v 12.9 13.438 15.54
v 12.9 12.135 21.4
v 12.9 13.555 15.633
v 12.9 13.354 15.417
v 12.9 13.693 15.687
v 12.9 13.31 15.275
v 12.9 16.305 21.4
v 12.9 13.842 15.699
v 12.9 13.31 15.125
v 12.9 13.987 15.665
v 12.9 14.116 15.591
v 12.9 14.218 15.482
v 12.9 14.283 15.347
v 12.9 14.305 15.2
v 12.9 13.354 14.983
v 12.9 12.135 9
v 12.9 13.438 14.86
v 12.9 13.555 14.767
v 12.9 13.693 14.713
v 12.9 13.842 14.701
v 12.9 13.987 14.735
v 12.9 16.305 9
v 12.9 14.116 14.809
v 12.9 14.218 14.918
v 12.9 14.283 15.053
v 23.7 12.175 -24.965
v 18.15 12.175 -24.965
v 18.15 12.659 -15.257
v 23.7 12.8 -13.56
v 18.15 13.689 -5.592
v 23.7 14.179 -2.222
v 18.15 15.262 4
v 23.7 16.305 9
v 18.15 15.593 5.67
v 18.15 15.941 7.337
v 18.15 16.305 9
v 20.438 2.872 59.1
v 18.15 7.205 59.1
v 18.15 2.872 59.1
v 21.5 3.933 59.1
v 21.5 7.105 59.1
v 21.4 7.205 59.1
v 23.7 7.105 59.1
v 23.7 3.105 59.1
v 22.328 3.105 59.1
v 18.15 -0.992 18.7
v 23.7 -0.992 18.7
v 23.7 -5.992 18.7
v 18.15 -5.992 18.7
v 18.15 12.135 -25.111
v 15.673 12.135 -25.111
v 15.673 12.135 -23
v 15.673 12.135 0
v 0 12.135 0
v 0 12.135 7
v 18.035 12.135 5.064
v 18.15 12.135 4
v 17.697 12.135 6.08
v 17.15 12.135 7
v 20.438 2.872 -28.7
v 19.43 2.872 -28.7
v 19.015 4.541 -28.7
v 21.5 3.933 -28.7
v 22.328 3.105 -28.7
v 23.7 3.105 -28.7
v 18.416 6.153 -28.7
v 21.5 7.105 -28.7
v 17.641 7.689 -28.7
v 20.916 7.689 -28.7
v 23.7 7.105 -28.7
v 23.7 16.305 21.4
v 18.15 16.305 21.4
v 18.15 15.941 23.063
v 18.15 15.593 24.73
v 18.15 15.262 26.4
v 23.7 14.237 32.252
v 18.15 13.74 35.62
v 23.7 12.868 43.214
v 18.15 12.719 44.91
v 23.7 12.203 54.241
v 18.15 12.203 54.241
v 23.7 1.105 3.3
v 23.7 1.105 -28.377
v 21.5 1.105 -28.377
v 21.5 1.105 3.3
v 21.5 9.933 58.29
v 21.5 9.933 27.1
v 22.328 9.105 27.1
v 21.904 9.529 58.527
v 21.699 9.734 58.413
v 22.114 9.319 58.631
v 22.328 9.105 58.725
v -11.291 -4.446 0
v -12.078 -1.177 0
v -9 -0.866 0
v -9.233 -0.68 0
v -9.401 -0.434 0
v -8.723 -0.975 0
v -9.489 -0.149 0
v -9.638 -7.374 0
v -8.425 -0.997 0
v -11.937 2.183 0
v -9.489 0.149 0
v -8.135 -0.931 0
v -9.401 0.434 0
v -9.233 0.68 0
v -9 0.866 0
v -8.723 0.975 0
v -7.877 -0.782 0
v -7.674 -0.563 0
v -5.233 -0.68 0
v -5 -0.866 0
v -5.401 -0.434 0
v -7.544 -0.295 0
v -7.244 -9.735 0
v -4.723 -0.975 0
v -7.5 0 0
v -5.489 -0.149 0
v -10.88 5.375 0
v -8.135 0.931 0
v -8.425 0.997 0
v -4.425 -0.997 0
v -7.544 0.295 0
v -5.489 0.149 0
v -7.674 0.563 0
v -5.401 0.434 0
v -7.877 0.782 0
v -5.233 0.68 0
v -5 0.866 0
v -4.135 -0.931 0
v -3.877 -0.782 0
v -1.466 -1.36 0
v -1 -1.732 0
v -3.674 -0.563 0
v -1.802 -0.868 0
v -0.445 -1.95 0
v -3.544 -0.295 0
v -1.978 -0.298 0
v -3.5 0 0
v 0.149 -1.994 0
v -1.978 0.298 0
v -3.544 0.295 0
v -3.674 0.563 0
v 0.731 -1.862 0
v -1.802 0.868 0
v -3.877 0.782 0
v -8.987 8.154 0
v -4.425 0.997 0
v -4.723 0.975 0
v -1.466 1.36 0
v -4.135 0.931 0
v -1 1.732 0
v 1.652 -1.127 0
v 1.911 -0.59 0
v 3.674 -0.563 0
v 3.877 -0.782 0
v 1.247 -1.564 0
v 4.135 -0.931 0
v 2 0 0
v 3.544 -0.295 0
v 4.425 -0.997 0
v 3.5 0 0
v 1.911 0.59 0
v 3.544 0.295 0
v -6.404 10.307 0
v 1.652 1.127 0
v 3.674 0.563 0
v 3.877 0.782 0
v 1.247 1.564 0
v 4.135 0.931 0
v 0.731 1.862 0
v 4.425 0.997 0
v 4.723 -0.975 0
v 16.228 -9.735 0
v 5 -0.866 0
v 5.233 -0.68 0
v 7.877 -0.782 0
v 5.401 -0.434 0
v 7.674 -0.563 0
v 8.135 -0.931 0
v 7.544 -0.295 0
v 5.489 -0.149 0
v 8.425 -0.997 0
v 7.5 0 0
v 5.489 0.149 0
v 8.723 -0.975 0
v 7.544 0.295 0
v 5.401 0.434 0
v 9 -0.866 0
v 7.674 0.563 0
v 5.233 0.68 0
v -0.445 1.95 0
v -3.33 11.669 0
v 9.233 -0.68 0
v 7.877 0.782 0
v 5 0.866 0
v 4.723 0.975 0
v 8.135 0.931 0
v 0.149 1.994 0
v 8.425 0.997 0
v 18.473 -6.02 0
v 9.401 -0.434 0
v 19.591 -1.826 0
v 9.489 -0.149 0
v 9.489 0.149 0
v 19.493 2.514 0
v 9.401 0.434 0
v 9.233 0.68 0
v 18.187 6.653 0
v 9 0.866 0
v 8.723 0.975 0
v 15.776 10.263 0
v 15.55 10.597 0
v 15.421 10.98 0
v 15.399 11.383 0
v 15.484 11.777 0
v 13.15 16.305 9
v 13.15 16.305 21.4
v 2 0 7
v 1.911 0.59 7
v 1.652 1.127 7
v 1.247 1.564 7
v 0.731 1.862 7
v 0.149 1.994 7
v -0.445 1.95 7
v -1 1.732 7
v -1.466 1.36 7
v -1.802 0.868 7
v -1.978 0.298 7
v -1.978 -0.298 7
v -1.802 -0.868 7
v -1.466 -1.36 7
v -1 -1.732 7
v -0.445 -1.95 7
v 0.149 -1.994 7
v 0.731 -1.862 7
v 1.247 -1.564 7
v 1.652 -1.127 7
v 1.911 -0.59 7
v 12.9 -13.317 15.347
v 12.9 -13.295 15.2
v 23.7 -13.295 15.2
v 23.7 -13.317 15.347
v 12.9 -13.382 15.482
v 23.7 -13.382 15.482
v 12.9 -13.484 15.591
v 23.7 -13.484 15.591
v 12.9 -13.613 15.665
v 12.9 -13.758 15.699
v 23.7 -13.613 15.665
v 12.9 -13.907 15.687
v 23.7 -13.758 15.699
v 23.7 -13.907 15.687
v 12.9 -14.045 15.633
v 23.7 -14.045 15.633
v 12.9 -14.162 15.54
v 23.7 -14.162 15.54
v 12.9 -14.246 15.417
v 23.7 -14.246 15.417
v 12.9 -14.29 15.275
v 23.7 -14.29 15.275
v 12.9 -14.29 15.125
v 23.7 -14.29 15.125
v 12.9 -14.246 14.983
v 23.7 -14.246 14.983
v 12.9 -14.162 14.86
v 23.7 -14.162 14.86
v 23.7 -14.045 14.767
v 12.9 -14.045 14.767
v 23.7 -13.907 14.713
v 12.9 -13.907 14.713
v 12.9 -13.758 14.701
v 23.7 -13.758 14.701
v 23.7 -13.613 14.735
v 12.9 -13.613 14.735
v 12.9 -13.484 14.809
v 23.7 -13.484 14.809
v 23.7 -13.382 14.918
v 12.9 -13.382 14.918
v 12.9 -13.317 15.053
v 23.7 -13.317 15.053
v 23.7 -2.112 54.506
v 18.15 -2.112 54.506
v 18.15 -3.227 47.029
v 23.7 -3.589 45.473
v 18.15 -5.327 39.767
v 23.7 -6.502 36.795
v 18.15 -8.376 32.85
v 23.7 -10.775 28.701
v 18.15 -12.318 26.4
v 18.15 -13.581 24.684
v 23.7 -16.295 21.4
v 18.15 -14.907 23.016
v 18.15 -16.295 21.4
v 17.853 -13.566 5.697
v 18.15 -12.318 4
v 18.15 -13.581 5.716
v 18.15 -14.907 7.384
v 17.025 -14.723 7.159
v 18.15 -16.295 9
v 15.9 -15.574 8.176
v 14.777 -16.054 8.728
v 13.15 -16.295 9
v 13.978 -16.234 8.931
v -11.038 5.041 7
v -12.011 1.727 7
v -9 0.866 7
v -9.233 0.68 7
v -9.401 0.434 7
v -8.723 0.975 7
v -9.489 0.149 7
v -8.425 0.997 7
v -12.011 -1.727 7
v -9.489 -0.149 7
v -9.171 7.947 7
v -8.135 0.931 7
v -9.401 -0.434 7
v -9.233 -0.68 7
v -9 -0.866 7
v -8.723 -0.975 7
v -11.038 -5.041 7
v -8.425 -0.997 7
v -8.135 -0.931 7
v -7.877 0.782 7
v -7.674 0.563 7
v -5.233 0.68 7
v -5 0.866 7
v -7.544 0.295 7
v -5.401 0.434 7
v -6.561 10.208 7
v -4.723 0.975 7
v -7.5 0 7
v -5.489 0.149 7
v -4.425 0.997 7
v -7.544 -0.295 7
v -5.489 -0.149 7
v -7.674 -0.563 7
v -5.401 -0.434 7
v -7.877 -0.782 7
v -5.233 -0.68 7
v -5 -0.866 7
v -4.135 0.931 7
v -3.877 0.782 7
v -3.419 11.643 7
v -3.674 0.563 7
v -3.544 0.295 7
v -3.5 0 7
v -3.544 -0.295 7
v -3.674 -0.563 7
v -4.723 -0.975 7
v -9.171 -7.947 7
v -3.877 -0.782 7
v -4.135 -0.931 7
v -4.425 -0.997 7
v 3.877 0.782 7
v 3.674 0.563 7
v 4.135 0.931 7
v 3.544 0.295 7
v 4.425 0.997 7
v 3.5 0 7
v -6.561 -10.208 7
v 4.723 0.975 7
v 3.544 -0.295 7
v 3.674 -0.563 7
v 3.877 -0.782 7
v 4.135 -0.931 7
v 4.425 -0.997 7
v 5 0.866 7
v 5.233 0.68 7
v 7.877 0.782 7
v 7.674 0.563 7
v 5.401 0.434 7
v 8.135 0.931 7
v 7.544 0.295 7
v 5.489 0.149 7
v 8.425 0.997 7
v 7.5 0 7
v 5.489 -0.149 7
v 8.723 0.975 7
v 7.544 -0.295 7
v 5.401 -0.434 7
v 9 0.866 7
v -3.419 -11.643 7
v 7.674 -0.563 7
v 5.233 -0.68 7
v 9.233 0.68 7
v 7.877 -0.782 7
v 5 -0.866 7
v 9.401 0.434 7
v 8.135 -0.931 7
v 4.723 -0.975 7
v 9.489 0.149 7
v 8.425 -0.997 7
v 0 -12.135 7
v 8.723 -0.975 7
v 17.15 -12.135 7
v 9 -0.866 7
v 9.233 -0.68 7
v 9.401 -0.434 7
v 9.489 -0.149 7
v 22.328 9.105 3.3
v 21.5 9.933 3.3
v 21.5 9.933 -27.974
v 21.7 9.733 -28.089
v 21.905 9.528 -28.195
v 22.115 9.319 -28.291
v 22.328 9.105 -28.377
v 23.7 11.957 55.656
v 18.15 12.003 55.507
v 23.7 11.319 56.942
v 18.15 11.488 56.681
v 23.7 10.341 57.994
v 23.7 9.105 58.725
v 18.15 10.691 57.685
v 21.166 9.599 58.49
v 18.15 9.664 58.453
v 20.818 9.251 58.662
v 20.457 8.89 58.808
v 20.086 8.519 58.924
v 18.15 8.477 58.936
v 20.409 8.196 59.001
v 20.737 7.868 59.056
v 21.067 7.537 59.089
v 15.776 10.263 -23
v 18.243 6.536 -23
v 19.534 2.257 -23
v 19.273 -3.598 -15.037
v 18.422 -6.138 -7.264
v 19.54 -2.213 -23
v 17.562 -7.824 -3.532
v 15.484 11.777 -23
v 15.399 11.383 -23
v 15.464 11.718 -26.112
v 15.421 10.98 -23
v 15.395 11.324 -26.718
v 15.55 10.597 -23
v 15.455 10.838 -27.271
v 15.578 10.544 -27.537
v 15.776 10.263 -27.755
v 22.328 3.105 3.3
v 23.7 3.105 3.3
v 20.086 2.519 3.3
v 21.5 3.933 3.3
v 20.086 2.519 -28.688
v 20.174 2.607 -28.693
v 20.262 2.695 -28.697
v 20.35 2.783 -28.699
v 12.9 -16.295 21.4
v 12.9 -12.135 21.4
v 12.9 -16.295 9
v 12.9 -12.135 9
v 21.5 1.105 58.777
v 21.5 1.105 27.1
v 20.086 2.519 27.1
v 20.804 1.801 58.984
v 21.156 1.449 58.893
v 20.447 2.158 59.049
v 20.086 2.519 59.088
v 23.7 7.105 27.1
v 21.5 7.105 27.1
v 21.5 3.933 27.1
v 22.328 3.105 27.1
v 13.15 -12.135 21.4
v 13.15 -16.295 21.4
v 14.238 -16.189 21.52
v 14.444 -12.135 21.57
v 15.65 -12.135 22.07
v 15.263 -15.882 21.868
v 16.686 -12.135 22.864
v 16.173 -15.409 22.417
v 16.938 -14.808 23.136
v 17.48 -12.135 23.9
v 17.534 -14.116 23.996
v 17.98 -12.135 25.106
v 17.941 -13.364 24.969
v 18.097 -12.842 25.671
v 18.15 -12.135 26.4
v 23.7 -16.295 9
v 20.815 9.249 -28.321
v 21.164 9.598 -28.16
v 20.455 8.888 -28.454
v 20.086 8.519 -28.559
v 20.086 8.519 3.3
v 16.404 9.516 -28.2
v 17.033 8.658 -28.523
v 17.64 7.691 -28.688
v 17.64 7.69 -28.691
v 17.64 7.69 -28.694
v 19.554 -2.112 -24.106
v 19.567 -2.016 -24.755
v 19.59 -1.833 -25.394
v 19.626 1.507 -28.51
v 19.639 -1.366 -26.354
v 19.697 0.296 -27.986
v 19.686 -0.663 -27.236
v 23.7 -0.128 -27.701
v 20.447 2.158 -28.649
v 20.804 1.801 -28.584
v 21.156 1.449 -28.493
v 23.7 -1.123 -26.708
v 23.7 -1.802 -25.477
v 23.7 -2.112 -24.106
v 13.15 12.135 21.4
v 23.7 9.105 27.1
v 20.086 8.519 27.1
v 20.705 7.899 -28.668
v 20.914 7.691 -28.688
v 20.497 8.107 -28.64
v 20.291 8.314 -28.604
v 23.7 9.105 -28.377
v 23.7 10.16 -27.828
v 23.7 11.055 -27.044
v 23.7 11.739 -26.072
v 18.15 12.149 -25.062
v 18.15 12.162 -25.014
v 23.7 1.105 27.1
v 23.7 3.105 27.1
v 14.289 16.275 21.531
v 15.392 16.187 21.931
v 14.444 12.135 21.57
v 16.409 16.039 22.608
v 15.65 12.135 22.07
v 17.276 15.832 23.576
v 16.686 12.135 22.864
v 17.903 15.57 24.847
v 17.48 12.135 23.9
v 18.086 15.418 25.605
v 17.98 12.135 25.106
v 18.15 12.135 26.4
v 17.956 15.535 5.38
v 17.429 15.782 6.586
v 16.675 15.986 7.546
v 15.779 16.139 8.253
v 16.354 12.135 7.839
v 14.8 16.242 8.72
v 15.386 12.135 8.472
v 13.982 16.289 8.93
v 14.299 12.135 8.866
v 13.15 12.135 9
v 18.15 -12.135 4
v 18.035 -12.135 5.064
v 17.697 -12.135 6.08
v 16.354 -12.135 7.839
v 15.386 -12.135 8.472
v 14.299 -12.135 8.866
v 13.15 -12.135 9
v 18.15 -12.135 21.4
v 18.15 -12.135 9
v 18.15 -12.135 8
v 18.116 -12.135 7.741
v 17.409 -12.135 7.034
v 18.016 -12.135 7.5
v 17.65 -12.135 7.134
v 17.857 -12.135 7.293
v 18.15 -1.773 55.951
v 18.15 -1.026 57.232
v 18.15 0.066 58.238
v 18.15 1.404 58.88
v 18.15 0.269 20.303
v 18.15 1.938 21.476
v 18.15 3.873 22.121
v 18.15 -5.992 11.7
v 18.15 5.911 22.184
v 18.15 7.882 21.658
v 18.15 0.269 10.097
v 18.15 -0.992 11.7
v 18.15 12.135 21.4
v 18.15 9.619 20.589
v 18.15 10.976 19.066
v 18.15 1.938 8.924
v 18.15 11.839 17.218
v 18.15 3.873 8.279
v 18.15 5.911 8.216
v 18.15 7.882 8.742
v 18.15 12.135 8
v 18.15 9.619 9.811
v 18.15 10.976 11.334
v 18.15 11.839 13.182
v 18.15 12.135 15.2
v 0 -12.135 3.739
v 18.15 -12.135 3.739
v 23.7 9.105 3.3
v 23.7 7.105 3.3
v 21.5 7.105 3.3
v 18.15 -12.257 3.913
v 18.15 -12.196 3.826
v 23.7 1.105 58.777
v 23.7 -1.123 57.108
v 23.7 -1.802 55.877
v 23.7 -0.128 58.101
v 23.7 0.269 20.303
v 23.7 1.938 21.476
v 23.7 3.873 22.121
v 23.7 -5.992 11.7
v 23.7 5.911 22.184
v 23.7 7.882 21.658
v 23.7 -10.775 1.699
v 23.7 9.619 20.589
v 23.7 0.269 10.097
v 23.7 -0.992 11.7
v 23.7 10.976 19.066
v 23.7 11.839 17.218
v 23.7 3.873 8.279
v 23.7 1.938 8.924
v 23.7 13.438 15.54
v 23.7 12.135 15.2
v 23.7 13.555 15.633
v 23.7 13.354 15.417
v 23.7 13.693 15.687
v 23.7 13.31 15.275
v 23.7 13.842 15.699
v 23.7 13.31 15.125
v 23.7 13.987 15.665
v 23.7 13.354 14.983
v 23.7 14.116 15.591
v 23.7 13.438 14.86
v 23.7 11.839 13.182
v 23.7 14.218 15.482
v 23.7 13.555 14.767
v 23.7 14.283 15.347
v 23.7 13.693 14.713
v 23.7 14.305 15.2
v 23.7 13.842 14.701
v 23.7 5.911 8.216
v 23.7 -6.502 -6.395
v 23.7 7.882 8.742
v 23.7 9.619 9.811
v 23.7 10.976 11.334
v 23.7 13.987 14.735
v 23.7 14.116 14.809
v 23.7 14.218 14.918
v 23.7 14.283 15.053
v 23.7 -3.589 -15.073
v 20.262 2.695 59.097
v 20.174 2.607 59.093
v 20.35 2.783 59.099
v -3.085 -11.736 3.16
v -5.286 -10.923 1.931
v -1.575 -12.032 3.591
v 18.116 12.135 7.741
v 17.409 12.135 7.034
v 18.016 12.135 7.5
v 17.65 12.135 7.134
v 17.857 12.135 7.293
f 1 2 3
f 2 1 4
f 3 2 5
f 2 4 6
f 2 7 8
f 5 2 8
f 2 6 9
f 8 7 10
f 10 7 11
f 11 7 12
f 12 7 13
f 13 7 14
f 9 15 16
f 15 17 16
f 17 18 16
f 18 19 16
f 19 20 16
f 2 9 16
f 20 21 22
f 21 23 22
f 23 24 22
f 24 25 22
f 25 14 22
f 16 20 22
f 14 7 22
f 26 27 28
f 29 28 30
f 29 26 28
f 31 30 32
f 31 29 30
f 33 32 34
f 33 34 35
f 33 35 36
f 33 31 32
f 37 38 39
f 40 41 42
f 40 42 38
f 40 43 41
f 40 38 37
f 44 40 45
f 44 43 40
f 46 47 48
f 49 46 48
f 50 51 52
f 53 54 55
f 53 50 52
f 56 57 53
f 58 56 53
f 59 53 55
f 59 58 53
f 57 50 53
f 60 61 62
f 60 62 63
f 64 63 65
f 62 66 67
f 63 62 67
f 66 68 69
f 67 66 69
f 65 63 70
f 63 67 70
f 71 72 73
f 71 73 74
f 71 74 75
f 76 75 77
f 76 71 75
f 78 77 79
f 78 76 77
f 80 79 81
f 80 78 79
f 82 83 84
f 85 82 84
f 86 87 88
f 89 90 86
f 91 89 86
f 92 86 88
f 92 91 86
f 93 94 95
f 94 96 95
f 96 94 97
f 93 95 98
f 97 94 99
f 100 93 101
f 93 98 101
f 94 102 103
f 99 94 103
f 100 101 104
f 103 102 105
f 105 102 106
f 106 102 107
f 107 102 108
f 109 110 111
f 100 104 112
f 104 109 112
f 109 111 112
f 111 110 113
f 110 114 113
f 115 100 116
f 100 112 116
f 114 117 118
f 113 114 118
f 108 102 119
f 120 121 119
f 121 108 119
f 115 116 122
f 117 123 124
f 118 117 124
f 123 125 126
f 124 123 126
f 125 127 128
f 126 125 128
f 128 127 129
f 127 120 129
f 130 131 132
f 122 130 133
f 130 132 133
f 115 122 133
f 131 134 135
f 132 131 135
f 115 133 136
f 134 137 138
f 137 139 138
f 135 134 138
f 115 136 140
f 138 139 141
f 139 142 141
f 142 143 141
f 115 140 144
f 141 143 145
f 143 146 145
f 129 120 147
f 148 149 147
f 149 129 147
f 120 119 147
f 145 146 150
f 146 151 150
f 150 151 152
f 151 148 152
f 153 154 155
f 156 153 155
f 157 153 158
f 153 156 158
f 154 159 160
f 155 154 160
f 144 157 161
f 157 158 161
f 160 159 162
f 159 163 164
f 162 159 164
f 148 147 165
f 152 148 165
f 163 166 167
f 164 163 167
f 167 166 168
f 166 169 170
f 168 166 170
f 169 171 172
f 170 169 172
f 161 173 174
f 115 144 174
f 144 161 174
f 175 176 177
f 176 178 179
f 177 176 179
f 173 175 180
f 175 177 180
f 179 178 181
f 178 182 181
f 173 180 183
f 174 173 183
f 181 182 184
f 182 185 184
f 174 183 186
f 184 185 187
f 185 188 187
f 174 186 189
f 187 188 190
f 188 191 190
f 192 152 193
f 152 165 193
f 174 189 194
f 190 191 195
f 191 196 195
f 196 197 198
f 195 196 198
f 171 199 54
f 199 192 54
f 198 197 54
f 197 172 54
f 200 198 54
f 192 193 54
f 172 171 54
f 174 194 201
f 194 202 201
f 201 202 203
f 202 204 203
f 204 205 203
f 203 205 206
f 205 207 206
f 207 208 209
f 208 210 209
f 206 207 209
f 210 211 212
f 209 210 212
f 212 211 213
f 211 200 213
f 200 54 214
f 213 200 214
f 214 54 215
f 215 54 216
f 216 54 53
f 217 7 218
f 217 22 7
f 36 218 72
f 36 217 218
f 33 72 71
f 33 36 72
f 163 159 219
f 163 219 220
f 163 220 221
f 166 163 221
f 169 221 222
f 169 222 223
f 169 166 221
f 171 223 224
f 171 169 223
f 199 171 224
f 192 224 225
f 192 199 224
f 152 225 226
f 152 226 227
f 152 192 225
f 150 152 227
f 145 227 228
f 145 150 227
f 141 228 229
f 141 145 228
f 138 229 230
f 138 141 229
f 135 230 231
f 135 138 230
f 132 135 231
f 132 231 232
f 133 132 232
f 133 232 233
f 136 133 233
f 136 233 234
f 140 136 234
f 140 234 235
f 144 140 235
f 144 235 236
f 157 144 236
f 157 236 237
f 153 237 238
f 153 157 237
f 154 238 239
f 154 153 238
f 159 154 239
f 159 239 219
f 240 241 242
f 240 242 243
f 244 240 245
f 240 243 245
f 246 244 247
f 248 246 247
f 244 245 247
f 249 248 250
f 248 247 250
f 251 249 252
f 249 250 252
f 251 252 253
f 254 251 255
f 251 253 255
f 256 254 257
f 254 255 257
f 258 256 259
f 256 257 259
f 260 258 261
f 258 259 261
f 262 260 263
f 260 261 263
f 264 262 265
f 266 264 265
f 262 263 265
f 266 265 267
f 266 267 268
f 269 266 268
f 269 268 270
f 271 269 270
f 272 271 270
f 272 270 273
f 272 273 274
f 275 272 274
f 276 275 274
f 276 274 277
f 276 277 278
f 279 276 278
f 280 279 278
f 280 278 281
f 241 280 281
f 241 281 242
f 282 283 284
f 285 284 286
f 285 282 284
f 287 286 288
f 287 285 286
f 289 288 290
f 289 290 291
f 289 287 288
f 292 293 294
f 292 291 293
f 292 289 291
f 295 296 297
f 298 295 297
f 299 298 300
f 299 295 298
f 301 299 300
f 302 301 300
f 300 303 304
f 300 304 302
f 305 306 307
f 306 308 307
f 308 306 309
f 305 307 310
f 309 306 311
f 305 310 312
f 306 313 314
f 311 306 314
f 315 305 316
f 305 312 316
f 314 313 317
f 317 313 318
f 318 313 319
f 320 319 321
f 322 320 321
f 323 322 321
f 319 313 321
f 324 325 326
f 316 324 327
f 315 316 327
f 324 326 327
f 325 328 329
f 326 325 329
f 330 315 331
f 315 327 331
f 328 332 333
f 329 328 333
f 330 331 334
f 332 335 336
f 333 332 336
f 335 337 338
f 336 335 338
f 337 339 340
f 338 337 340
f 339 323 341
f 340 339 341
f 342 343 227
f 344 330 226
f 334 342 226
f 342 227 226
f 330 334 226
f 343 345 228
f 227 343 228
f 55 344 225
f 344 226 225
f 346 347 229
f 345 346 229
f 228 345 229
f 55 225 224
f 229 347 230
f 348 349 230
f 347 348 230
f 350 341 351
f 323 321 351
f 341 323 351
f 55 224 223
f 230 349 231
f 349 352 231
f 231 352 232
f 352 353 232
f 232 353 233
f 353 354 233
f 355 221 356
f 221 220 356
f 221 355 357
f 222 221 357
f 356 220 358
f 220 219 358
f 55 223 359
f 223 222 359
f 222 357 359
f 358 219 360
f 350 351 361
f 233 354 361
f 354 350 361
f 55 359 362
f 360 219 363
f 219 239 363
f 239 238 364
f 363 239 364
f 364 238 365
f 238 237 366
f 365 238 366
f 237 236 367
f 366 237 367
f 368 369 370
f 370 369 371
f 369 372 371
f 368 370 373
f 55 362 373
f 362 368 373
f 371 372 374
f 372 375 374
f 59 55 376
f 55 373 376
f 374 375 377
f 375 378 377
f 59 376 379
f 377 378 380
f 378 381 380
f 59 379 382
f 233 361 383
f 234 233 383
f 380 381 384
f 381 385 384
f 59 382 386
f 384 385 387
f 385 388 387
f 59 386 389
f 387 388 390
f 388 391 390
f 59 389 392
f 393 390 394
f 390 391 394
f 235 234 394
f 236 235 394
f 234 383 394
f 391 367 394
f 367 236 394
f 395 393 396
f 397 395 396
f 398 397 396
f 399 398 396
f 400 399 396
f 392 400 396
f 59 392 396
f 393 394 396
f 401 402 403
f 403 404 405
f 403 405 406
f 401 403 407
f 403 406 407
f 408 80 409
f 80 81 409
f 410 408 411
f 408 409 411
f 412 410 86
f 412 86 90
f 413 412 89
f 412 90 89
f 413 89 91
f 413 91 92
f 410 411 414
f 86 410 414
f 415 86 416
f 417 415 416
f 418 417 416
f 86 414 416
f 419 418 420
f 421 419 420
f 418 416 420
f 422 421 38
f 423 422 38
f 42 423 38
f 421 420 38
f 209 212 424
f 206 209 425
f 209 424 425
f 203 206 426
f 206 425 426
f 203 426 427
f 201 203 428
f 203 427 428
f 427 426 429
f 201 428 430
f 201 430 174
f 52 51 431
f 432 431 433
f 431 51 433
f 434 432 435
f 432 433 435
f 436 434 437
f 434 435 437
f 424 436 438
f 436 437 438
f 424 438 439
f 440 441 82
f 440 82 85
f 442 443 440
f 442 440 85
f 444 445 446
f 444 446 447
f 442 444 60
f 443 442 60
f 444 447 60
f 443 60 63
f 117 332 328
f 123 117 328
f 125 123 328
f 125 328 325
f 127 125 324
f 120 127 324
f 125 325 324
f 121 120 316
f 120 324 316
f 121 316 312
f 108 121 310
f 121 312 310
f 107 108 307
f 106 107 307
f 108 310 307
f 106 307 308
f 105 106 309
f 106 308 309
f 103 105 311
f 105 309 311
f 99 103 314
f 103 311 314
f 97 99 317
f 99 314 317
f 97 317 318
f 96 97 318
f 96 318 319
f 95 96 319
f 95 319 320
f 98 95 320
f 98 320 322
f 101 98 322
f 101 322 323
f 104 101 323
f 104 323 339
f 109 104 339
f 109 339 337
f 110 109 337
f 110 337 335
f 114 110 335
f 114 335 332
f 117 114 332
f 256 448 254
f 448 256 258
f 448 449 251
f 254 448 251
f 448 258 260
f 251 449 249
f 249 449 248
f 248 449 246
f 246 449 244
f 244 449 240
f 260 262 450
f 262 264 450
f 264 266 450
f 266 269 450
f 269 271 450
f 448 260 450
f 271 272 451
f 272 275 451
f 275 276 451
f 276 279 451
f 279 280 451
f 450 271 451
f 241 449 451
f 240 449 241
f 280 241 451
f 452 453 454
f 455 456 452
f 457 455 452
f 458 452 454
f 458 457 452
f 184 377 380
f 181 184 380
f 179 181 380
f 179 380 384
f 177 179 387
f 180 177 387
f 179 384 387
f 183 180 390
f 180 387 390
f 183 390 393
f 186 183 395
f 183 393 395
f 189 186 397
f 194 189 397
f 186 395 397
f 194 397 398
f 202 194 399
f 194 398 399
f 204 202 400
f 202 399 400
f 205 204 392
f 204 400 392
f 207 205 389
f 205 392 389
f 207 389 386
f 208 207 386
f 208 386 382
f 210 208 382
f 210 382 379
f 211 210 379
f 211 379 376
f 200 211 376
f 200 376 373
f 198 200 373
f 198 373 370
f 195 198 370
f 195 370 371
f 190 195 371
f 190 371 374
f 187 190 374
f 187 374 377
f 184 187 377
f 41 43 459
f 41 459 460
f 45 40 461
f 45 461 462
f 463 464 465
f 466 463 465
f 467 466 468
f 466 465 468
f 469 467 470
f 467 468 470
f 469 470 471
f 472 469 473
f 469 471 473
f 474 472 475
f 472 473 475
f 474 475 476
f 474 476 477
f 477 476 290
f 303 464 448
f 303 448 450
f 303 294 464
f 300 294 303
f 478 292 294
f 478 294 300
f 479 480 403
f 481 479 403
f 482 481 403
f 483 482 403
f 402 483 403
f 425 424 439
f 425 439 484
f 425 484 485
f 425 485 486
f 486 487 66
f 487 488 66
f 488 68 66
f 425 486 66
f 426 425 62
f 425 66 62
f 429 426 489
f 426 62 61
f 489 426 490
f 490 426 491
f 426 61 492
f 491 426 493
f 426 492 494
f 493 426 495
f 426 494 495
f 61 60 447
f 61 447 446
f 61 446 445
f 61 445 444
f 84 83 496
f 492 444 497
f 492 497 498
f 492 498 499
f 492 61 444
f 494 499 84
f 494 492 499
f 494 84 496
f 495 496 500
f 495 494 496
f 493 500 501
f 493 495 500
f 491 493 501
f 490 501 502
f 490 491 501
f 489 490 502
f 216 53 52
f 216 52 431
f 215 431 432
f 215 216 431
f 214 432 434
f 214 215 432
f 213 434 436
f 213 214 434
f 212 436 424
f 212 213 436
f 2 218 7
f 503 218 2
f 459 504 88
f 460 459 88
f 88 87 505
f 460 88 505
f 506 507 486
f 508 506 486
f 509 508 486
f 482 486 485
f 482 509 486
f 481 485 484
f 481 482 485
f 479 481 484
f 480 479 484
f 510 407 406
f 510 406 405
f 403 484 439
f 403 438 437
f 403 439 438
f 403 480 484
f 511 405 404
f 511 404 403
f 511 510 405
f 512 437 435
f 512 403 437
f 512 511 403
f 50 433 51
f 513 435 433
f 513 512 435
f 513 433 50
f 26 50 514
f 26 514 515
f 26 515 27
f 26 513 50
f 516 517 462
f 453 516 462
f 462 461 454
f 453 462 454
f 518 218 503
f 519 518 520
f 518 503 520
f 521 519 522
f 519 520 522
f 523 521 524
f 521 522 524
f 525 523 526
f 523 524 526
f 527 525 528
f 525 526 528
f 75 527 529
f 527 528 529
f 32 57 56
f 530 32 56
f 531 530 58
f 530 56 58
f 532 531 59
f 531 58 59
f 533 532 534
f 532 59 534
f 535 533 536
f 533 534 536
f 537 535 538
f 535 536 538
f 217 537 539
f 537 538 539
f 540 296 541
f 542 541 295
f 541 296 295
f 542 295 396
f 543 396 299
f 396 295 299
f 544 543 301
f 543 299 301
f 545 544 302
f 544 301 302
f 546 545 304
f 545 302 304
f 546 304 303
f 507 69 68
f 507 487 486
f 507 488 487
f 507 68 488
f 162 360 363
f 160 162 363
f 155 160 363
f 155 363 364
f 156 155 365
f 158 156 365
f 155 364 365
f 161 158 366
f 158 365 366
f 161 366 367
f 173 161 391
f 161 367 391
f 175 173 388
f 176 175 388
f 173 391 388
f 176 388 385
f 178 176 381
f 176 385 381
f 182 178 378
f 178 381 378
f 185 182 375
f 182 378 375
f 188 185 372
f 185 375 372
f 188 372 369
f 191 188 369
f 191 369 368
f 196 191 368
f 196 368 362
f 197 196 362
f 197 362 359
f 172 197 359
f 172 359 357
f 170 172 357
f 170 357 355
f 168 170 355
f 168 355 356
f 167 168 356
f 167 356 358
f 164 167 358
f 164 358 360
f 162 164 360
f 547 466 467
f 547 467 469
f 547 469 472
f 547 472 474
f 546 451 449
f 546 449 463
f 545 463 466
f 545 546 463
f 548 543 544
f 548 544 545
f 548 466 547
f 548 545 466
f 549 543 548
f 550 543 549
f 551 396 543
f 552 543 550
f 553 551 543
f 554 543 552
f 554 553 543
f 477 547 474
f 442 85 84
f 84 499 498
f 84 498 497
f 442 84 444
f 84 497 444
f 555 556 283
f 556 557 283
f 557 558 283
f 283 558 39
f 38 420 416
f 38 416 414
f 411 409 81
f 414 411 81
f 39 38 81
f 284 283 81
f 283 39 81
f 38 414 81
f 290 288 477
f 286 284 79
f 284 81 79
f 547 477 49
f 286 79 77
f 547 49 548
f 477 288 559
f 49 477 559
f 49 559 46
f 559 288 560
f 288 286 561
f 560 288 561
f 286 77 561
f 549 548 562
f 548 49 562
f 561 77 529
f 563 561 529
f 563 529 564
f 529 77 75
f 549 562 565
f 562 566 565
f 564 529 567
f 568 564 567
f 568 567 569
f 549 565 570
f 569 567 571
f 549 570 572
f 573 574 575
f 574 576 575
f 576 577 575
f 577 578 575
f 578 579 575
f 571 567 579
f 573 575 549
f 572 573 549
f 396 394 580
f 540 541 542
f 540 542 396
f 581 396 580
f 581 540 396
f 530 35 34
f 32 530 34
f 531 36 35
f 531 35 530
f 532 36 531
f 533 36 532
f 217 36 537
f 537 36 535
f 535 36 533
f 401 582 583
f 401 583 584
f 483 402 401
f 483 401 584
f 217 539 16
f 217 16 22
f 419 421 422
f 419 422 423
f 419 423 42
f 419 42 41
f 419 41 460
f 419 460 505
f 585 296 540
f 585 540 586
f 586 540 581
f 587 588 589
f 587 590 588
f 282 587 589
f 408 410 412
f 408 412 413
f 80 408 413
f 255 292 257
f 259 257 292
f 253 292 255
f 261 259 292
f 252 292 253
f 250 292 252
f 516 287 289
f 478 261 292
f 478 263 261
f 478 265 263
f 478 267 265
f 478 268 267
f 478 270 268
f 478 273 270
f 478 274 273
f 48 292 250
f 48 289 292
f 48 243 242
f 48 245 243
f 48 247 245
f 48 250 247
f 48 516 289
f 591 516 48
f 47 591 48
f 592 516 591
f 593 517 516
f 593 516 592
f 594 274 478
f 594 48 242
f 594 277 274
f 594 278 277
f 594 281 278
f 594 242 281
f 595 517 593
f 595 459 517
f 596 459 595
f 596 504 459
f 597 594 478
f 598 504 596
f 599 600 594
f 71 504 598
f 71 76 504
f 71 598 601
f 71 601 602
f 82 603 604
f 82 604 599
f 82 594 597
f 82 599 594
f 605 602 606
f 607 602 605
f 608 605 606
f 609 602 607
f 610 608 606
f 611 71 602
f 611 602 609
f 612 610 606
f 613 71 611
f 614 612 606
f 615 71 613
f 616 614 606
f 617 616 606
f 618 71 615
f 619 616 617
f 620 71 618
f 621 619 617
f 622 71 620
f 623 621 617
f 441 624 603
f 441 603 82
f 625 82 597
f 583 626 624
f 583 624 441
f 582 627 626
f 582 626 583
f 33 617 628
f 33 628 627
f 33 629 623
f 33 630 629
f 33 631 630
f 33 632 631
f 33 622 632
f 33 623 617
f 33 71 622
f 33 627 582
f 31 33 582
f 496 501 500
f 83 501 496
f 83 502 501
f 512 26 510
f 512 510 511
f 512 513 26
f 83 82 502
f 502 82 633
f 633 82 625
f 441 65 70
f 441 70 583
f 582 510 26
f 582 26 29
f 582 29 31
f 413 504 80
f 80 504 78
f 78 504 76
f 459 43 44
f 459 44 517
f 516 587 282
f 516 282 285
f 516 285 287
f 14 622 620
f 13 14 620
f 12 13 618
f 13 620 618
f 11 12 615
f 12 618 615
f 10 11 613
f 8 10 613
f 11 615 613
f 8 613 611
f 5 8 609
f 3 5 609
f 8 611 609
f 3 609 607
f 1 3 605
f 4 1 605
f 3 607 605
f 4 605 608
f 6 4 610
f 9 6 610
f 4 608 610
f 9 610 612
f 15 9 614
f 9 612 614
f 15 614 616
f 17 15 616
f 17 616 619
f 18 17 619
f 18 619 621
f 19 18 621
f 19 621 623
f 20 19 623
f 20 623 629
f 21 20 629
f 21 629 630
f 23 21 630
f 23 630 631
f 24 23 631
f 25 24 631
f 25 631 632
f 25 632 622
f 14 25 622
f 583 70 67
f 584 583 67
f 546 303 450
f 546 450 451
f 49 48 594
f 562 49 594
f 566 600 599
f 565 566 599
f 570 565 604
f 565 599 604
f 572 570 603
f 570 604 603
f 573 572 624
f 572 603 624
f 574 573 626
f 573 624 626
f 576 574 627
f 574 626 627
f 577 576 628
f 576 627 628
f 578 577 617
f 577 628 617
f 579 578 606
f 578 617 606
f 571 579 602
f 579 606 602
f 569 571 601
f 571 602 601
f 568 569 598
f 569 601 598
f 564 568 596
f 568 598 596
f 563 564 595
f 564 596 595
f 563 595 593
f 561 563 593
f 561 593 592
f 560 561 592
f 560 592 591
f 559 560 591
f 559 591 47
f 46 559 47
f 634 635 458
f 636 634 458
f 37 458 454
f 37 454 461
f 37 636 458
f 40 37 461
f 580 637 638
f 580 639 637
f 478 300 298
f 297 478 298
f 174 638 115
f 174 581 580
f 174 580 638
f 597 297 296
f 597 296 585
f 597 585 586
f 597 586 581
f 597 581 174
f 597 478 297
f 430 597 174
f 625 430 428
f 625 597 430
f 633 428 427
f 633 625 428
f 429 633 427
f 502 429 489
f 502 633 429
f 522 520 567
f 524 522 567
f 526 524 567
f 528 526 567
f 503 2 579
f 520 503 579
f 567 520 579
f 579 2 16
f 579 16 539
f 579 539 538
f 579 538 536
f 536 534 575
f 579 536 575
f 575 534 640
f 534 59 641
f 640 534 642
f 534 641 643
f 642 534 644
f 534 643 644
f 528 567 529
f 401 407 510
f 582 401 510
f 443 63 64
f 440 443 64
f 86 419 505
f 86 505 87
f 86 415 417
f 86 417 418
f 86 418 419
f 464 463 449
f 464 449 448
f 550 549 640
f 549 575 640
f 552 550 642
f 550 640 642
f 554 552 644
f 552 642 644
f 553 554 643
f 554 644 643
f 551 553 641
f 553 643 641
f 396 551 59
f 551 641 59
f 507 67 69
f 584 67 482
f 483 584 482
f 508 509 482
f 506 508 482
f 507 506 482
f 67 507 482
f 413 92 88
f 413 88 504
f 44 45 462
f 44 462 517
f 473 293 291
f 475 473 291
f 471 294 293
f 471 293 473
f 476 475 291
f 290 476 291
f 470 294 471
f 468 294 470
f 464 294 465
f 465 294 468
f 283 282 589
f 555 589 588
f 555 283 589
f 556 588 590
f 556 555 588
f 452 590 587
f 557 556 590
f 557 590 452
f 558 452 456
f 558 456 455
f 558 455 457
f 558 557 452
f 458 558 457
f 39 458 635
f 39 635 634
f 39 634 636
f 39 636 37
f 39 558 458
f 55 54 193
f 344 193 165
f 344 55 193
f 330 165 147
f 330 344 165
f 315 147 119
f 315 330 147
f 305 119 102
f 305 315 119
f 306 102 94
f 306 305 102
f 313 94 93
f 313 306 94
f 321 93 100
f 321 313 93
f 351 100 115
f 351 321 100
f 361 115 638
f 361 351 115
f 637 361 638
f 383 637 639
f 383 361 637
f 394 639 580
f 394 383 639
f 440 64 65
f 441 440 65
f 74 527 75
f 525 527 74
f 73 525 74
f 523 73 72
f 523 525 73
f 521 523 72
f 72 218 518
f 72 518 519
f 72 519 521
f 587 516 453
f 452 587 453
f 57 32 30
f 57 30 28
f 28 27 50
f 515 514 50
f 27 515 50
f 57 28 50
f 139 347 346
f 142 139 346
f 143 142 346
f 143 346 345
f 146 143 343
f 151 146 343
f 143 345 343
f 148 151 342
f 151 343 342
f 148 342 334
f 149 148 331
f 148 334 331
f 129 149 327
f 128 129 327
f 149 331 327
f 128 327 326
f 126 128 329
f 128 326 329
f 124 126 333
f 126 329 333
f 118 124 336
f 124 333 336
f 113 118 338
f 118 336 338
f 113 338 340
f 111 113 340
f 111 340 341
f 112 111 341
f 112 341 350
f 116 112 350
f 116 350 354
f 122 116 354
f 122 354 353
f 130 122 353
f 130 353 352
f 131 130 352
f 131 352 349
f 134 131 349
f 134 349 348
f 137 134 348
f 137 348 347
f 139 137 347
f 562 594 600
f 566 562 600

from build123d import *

# Parameters (mm, degrees)
SKETCH1_R               = 2
BOSS_EXTRUDE3_DEPTH     = 7
SKETCH3_R               = 1.0000000000000002
SKETCH3_R_2             = 0.9999999999999998
SKETCH3_R_3             = 0.9999999999999996
SKETCH3_R_4             = 0.9999999999999993
CUT_EXTRUDE2_DEPTH      = 26.09227496303999
BOSS_EXTRUDE4_START     = -7
BOSS_EXTRUDE4_DEPTH     = 7
BOSS_EXTRUDE5_START     = -30
BOSS_EXTRUDE5_DEPTH     = 30
FILLET2_R               = 1.5
CUT_EXTRUDE5_DEPTH      = 42.36510924463761
BOSS_EXTRUDE6_DEPTH     = 10.5
MOVE_START              = -28.7
MOVE_FACE1_DEPTH        = 5.7
DELETEFACE1_START       = 23.7
DELETEFACE1_OUTLINE_W   = 10.499999999999998
DELETEFACE1_OUTLINE_H   = 35.699999999999996
DELETEFACE1_DEPTH       = 15.7
SKETCH11_OUTSIDE_W      = 51.876
SKETCH11_OUTSIDE_H      = 42.462
CUT_EXTRUDE6_DEPTH      = 46.16926949380307
SERVO_START             = -12.760864102
SERVO_MICRO_OUTLINE_W   = 22.6
SERVO_MICRO_OUTLINE_H   = 12.399999999999999
SERVO_MICRO_DEPTH       = 22.3
SERVO_START_2           = 9.539135898
SERVO_MICRO_2_DEPTH     = 4.3
SERVO_START_3           = 2.889135898
SERVO_MICRO_3_DEPTH     = 2.4
SERVO_START_4           = 13.839135898
SERVO_MICRO_4_OUTLINE_R = 2.5
SERVO_MICRO_4_DEPTH     = 3.3
SERVO_START_5           = -25.667487826
SERVO_MICRO_5_OUTLINE_R = 0.6
SERVO_MICRO_5_DEPTH     = 2.3
SERVO_MICRO_6_OUTLINE_R = 0.6
SERVO_MICRO_6_DEPTH     = 2.3
SERVO_MICRO_7_OUTLINE_R = 0.6
SERVO_MICRO_7_DEPTH     = 2.3
BODY_MOVE_COPY1_ANGLE   = 90
SKETCH13_R              = 0.5000000000000009
SKETCH13_W              = 12.399999999999997
SKETCH13_H              = 4.17
SKETCH13_H_2            = 4.160545319150279
BOSS_EXTRUDE7_DEPTH     = 5.55
SKETCH13_3_W            = 12.399999999999997
SKETCH13_3_H            = 4.17
SKETCH13_3_R            = 0.5000000000000009
SKETCH13_3_H_2          = 4.160545319150279
BOSS_EXTRUDE8_DEPTH     = 10.8
CUT_EXTRUDE7_DEPTH      = 32
BOSS_EXTRUDE9_DEPTH     = 5.55
CUT_EXTRUDE8_DEPTH      = 72.0125468998838
BOSS_EXTRUDE10_DEPTH    = 5.55
FILLET4_R               = 5
CUT_EXTRUDE10_DEPTH     = 72.01254695034633
FILLET8_START           = 12.13472734
FILLET8_DEPTH           = 2.98662
FILLET8_START_2         = -12.463268044
FILLET8_2_DEPTH         = 0.328540704
FILLET8_START_3         = -16.295273118
FILLET8_3_DEPTH         = 3.832005074
FILLET8_START_4         = 15.12134734
FILLET8_4_DEPTH         = 1.18338
FILLET8_START_5         = -7.24411042
FILLET8_5_DEPTH         = 25.39411042
FILLET9_R               = 1


with BuildPart() as part:
    # Sketch1 → Boss-Extrude3 (new body)
    with BuildSketch(Plane.XY):
        with BuildLine():
            Line((5.606455718863049, 13.824363162033857), (-15.462379801128069, 15.791841653866829))
            Line((-15.462379801128069, 15.791841653866829), (-15.46237980112806, -15.791841653866806))
            Line((-15.46237980112806, -15.791841653866806), (5.606455718863063, -13.824363162033817))
            ThreePointArc((5.606455718863063, -13.824363162033817), (18.200000000000003, 2.613e-14), (5.606455718863049, 13.824363162033857))
        make_face()
        Circle(SKETCH1_R, mode=Mode.SUBTRACT)
    extrude(amount=BOSS_EXTRUDE3_DEPTH)

    # Sketch3 → Cut-Extrude2 (cut, through all)
    with BuildSketch(Plane.XY.offset(7)):
        with Locations((-4.5, 0)):
            Circle(SKETCH3_R)
        with Locations((-8.499999999999998, 0)):
            Circle(SKETCH3_R_2)
        with Locations(Location((4.5, -1.73e-15, 0), (0, 0, 180))):
            Circle(SKETCH3_R_3)
        with Locations(Location((8.499999999999998, -1.73e-15, 0), (0, 0, 180))):
            Circle(SKETCH3_R_4)
    extrude(amount=-CUT_EXTRUDE2_DEPTH, mode=Mode.SUBTRACT)

    # Sketch6 → Boss-Extrude4 (add)
    with BuildSketch(Plane.XY.offset(7).offset(BOSS_EXTRUDE4_START)):
        with BuildLine():
            Line((12.20372638619735, 13.208287910486863), (5.606455718863047, 13.824363162033858))
            ThreePointArc((5.606455718863047, 13.82436316203386), (18.2, 2.598e-14), (5.606455718863056, -13.824363162033816))
            Line((5.606455718863056, -13.824363162033816), (12.203726386197348, -13.208287910486817))
            ThreePointArc((12.203726386197348, -13.208287910486817), (19.699999999999996, 2.132e-14), (12.20372638619735, 13.20828791048686))
        make_face()
    extrude(amount=BOSS_EXTRUDE4_DEPTH)

    # Sketch6<3> → Boss-Extrude5 (add)
    with BuildSketch(Plane.XY.offset(7).offset(BOSS_EXTRUDE5_START)):
        with BuildLine():
            Line((23.700000000000006, 12.13472734042489), (12.20372638619735, 13.208287910486863))
            ThreePointArc((12.20372638619735, 13.20828791048686), (19.699999999999996, 2.132e-14), (12.203726386197348, -13.208287910486817))
            Line((12.203726386197348, -13.208287910486817), (23.700000000000003, -12.134727340424835))
            Line((23.700000000000003, -12.134727340424835), (23.700000000000006, 12.134727340424892))
        make_face()
    extrude(amount=BOSS_EXTRUDE5_DEPTH)

    # Fillet2
    fillet2_edges = [part.edges().sort_by_distance(p)[0] for p in [
        (12.20372638619735, -13.208287910486817, -11.5),
        (12.20372638619735, 13.208287910486861, -11.5),
    ]]
    fillet(fillet2_edges, radius=FILLET2_R)

    # Sketch8 → Cut-Extrude5 (cut, through all)
    with BuildSketch(Plane.XY.offset(7)):
        with BuildLine():
            Line((-15.462379801128069, 15.791841653866829), (-15.46237980112806, -15.791841653866808))
            Line((-15.46237980112806, -15.791841653866806), (1.328273056892355, -14.223874201150027))
            ThreePointArc((1.3282730568923518, -14.22387420115002), (-14.285758873920813, 0), (1.3282730568923529, 14.22387420115002))
            Line((1.3282730568923604, 14.223874201150062), (-15.462379801128069, 15.791841653866829))
        make_face()
    extrude(amount=-CUT_EXTRUDE5_DEPTH, mode=Mode.SUBTRACT)

    # Sketch10 → Boss-Extrude6 (add)
    with BuildSketch(Plane.ZX.offset(1.6347273404248903)):
        Polygon((7, 23.700000000000003), (7, 39.40000000018666), (-28.700000000000003, 39.40000000018665), (-28.700000000000014, 23.700000000000003), align=None)
    extrude(amount=BOSS_EXTRUDE6_DEPTH)

    # Move Face1: read off the stored shape, not the designer's step
    # Move Face1 outline → Move Face1 (add)
    with BuildSketch(Plane.XY.offset(MOVE_START)):
        with BuildLine():
            Line((17.033263706, -12.757289525), (23.7, -12.13472734))
            Line((23.7, -12.13472734), (23.7, 12.13472734))
            Line((23.7, 12.13472734), (17.033263706, 12.757289525))
            ThreePointArc((17.033263706, 12.757289525), (15.554272674, 11.938827155), (15.776353621, 10.263125757))
            ThreePointArc((15.776353621, 10.263125757), (19.7, 0), (15.776353621, -10.263125757))
            ThreePointArc((15.776353621, -10.263125757), (15.554272674, -11.938827155), (17.033263706, -12.757289525))
        make_face()
    extrude(amount=MOVE_FACE1_DEPTH)

    # DeleteFace1: read off the stored shape, not the designer's step
    # DeleteFace1 outline → DeleteFace1 (cut)
    with BuildSketch(Plane.YZ.offset(DELETEFACE1_START)):
        with Locations((6.884727339999999, -10.849999999999998)):
            Rectangle(DELETEFACE1_OUTLINE_W, DELETEFACE1_OUTLINE_H)
    extrude(amount=DELETEFACE1_DEPTH, mode=Mode.SUBTRACT)

    # Sketch11 outside → Cut-Extrude6 (cut, through all)
    with BuildSketch(Plane.XY.offset(7)):
        with Locations((4.706999999999997, 0)):
            Rectangle(SKETCH11_OUTSIDE_W, SKETCH11_OUTSIDE_H)
        with BuildLine():
            Line((23.700000000000003, 12.134727340424888), (-1.43e-15, 12.134727340424885))
            ThreePointArc((-1.43e-15, 12.134727340424885), (-12.134727340424885, 1.49e-15), (0, -12.134727340424885))
            Line((0, -12.134727340424885), (23.700000000000006, -12.134727340424835))
            Line((23.700000000000006, -12.134727340424835), (23.700000000000003, 12.134727340424888))
        make_face(mode=Mode.SUBTRACT)
    extrude(amount=-CUT_EXTRUDE6_DEPTH, mode=Mode.SUBTRACT)

    # Sketch13 → Boss-Extrude7 (add)
    # profile 1 of 3: a face of its own
    with BuildSketch(Plane(origin=(23.700000000000003, -3.39e-15, 0), x_dir=(0, 0, -1), z_dir=(1, -1.4e-16, 0))):
        Polygon((-9.000000000000002, -16.295272659575108), (-9.000000000000002, -12.134727340424831), (-7, -12.134727340424831), (-6.999999999999999, 12.134727340424892), (-9.000000000000002, 12.13472734042489), (-9.000000000000002, 16.30472734042489), (-21.4, 16.30472734042489), (-21.4, 12.13472734042489), (-59.100000000000016, 12.134727340424885), (-59.100000000000016, -12.134727340424831), (-21.4, -12.134727340424831), (-21.4, -16.295272659575108), align=None)
        with Locations(Location((-15.200000000000001, 13.80472734042489, 0), (0, 0, 90))):
            Circle(SKETCH13_R, mode=Mode.SUBTRACT)
        with Locations(Location((-15.200000000000001, -13.79527265957511, 0), (0, 0, 90))):
            Circle(SKETCH13_R, mode=Mode.SUBTRACT)
        with BuildLine():
            ThreePointArc((-11.700000000000001, -0.9920668991734916), (-15.199999999999998, 12.13472734042489), (-18.700000000000003, -0.9920668991734924))
            Line((-18.700000000000003, -0.9920668991734924), (-18.700000000000003, -5.9920668991734924))
            Line((-18.700000000000003, -5.9920668991734924), (-11.700000000000003, -5.992066899173492))
            Line((-11.700000000000003, -5.992066899173492), (-11.700000000000001, -0.9920668991734916))
        make_face(mode=Mode.SUBTRACT)
    # profile 2 of 3: a face of its own
    with BuildSketch(Plane(origin=(23.700000000000003, -3.39e-15, 0), x_dir=(0, 0, -1), z_dir=(1, -1.4e-16, 0))):
        with Locations((-15.2, 14.219727340424889)):
            Rectangle(SKETCH13_W, SKETCH13_H)
        with Locations(Location((-15.200000000000001, 13.80472734042489, 0), (0, 0, 90))):
            Circle(SKETCH13_R, mode=Mode.SUBTRACT)
    # profile 3 of 3: a face of its own
    with BuildSketch(Plane(origin=(23.700000000000003, -3.39e-15, 0), x_dir=(0, 0, -1), z_dir=(1, -1.4e-16, 0))):
        with Locations((-15.2, -14.214999999999968)):
            Rectangle(SKETCH13_W, SKETCH13_H_2)
        with Locations(Location((-15.200000000000001, -13.79527265957511, 0), (0, 0, 90))):
            Circle(SKETCH13_R, mode=Mode.SUBTRACT)
    extrude(amount=-BOSS_EXTRUDE7_DEPTH)

    # Sketch13<3> → Boss-Extrude8 (add)
    # profile 1 of 2: a face of its own
    with BuildSketch(Plane(origin=(23.700000000000003, -3.39e-15, 0), x_dir=(0, 0, -1), z_dir=(1, -1.4e-16, 0))):
        with Locations((-15.2, 14.219727340424889)):
            Rectangle(SKETCH13_3_W, SKETCH13_3_H)
        with Locations(Location((-15.200000000000001, 13.80472734042489, 0), (0, 0, 90))):
            Circle(SKETCH13_3_R, mode=Mode.SUBTRACT)
    # profile 2 of 2: a face of its own
    with BuildSketch(Plane(origin=(23.700000000000003, -3.39e-15, 0), x_dir=(0, 0, -1), z_dir=(1, -1.4e-16, 0))):
        with Locations((-15.2, -14.214999999999968)):
            Rectangle(SKETCH13_3_W, SKETCH13_3_H_2)
        with Locations(Location((-15.200000000000001, -13.79527265957511, 0), (0, 0, 90))):
            Circle(SKETCH13_3_R, mode=Mode.SUBTRACT)
    extrude(amount=-BOSS_EXTRUDE8_DEPTH)

    # Sketch15 → Cut-Extrude7 (cut)
    with BuildSketch(Plane(origin=(1.903e-14, 0, -28.70000000000003), x_dir=(-1, 0, -6.6e-16), z_dir=(6.6e-16, 0, -1))):
        Polygon((-22.328427124746177, 3.104727340424887), (-23.699999999999985, 3.104727340424887), (-23.699999999999985, 1.1047273404248876), (-21.499999999999986, 1.1047273404248876), (-20.08578643762689, 2.5189409027979854), (-21.49999999999999, 3.9331544651710773), align=None)
        Polygon((-22.328427124746177, 9.104727340424887), (-23.699999999999985, 9.104727340424887), (-23.699999999999985, 7.104727340424887), (-21.499999999999986, 7.104727340424887), (-20.08578643762689, 8.518940902797986), (-21.49999999999999, 9.933154465171077), align=None)
    cut_extrude7 = extrude(amount=-CUT_EXTRUDE7_DEPTH, mode=Mode.SUBTRACT)

    # Mirror1: Cut-Extrude7 across plane
    add(cut_extrude7.mirror(Plane(origin=(0, 0, 15.200000000000001), x_dir=(1, 0, 0), z_dir=(0, 0, -1))), mode=Mode.SUBTRACT)

    # Sketch16 → Boss-Extrude9 (add)
    with BuildSketch(Plane(origin=(23.700000000000003, -3.39e-15, 0), x_dir=(0, 0, -1), z_dir=(1, -1.4e-16, 0))):
        with BuildLine():
            Line((-21.4, 12.13472734042489), (-21.4, 16.30472734042489))
            ThreePointArc((-21.4, 16.30472734042489), (-40.135039546574305, 13.18039662240372), (-59.100000000000016, 12.134727340424885))
            Line((-59.100000000000016, 12.134727340424885), (-21.4, 12.13472734042489))
        make_face()
        with BuildLine():
            Line((-9.000000000000002, 16.30472734042489), (-9.000000000000002, 12.13472734042489))
            Line((-9.000000000000002, 12.13472734042489), (28.700000000000014, 12.134727340424892))
            ThreePointArc((28.700000000000014, 12.134727340424892), (9.735039546574328, 13.180396622403777), (-9.000000000000002, 16.30472734042489))
        make_face()
    extrude(amount=-BOSS_EXTRUDE9_DEPTH)

    # Sketch18 → Cut-Extrude8 (cut, through all)
    with BuildSketch(Plane(origin=(23.700000000000003, -3.39e-15, 0), x_dir=(0, 0, -1), z_dir=(1, -1.4e-16, 0))):
        with BuildLine():
            Line((-59.100000000000016, -12.134727340424831), (-26.661429094135563, -12.134727340424831))
            ThreePointArc((-26.661429094135563, -12.134727340424838), (-42.096369157624615, -4.537893974213425), (-59.100000000000016, -1.9252726595751))
            Line((-59.100000000000016, -1.9252726595751037), (-59.100000000000016, -12.134727340424831))
        make_face()
        with BuildLine():
            Line((-3.7385709058644423, -12.134727340424831), (28.700000000000003, -12.134727340424831))
            Line((28.700000000000003, -12.134727340424831), (28.700000000000003, -1.9252726595751037))
            ThreePointArc((28.700000000000003, -1.9252726595751), (11.69636915762461, -4.537893974213425), (-3.738570905864435, -12.134727340424838))
        make_face()
    extrude(amount=-CUT_EXTRUDE8_DEPTH, mode=Mode.SUBTRACT)

    # Sketch18<3> → Boss-Extrude10 (add)
    with BuildSketch(Plane(origin=(23.700000000000003, -3.39e-15, 0), x_dir=(0, 0, -1), z_dir=(1, -1.4e-16, 0))):
        with BuildLine():
            ThreePointArc((-26.661429094135563, -12.134727340424838), (-23.96906894889605, -14.137042924937433), (-21.4, -16.295272659575097))
            Line((-21.4, -16.295272659575108), (-21.4, -12.134727340424831))
            Line((-21.4, -12.134727340424831), (-26.66142909413556, -12.134727340424831))
        make_face()
        with BuildLine():
            ThreePointArc((-9, -16.295272659575097), (-6.430931051103947, -14.137042924937433), (-3.738570905864435, -12.134727340424838))
            Line((-3.7385709058644423, -12.134727340424831), (-9.000000000000005, -12.134727340424831))
            Line((-9.000000000000005, -12.134727340424831), (-9.000000000000005, -16.295272659575108))
        make_face()
    extrude(amount=-BOSS_EXTRUDE10_DEPTH)

    # Fillet4
    fillet4_edges = [part.edges().sort_by_distance(p)[0] for p in [
        (21.63952842596371, -1.9252726595751048, -28.700000000000003),
        (20.925, -1.925272659575101, 59.10000000000002),
        (20.925000000000004, 12.134727340424881, 59.100000000000016),
    ]]
    fillet(fillet4_edges, radius=FILLET4_R)

    # Sketch19 → Cut-Extrude10 (cut, through all)
    with BuildSketch(Plane(origin=(23.700000000000003, -3.39e-15, 0), x_dir=(0, 0, -1), z_dir=(1, -1.4e-16, 0))):
        with BuildLine():
            Line((24.105591483628846, 12.321380196120076), (30.19974331893468, 12.321380196120076))
            Line((30.19974331893468, 12.321380196120076), (30.19974331893468, 7.512752922909521))
            Line((30.19974331893468, 7.512752922909521), (28.687547870024137, 7.690513778051795))
            ThreePointArc((28.687547870024137, 7.690513778051795), (28.58393863914358, 8.408905582685197), (28.37741082226619, 9.10472734042489))
            ThreePointArc((28.37741082226619, 9.10472734042489), (26.70764725474025, 11.33211091295099), (24.105591483628846, 12.321380196120076))
        make_face()
    extrude(amount=-CUT_EXTRUDE10_DEPTH, mode=Mode.SUBTRACT)

    # Fillet8: read off the stored shape, not the designer's step
    # Fillet8 outline → Fillet8 (add)
    with BuildSketch(Plane(origin=(0, 0, 0), x_dir=(1, 0, 0), z_dir=(0, 1, 0)).offset(FILLET8_START)):
        with BuildLine():
            Line((13.15, -9), (18.15, -9))
            Line((18.15, -9), (18.15, -4))
            ThreePointArc((18.15, -4), (16.685533906, -7.535533906), (13.15, -9))
        make_face()
        with BuildLine():
            ThreePointArc((13.15, -21.4), (16.685533906, -22.864466094), (18.15, -26.4))
            Line((18.15, -26.4), (18.15, -21.4))
            Line((18.15, -21.4), (13.15, -21.4))
        make_face()
    extrude(amount=FILLET8_DEPTH)

    # Fillet8 2 outline → Fillet8 2 (add)
    with BuildSketch(Plane(origin=(0, 0, 0), x_dir=(1, 0, 0), z_dir=(0, 1, 0)).offset(FILLET8_START_2)):
        with BuildLine():
            Line((13.15, -9), (18.15, -9))
            Line((18.15, -9), (18.15, -4))
            ThreePointArc((18.15, -4), (16.685533906, -7.535533906), (13.15, -9))
        make_face()
        with BuildLine():
            ThreePointArc((13.15, -21.4), (16.685533906, -22.864466094), (18.15, -26.4))
            Line((18.15, -26.4), (18.15, -21.4))
            Line((18.15, -21.4), (13.15, -21.4))
        make_face()
    extrude(amount=FILLET8_2_DEPTH)

    # Fillet8 3 outline → Fillet8 3 (add)
    with BuildSketch(Plane(origin=(0, 0, 0), x_dir=(1, 0, 0), z_dir=(0, 1, 0)).offset(FILLET8_START_3)):
        with BuildLine():
            ThreePointArc((13.15, -21.4), (16.685533906, -22.864466094), (18.15, -26.4))
            Line((18.15, -26.4), (18.15, -21.4))
            Line((18.15, -21.4), (13.15, -21.4))
        make_face()
        with BuildLine():
            ThreePointArc((18.15, -4), (16.685533906, -7.535533906), (13.15, -9))
            Line((13.15, -9), (18.15, -9))
            Line((18.15, -9), (18.15, -4))
        make_face()
    extrude(amount=FILLET8_3_DEPTH)

    # Fillet8 4 outline → Fillet8 4 (add)
    with BuildSketch(Plane(origin=(0, 0, 0), x_dir=(1, 0, 0), z_dir=(0, 1, 0)).offset(FILLET8_START_4)):
        with BuildLine():
            ThreePointArc((13.15, -21.4), (16.685533906, -22.864466094), (18.15, -26.4))
            Line((18.15, -26.4), (18.15, -21.4))
            Line((18.15, -21.4), (13.15, -21.4))
        make_face()
        with BuildLine():
            ThreePointArc((18.15, -4), (16.685533906, -7.535533906), (13.15, -9))
            Line((13.15, -9), (18.15, -9))
            Line((18.15, -9), (18.15, -4))
        make_face()
    extrude(amount=FILLET8_4_DEPTH)

    # Fillet8 5 outline → Fillet8 5 (cut)
    with BuildSketch(Plane.YZ.offset(FILLET8_START_5)):
        with BuildLine():
            ThreePointArc((-12.31848008, 4), (-14.236321993, 6.556116122), (-16.295272761, 9.000000114))
            Line((-16.295272761, 9.000000114), (-16.295273118, 4))
            Line((-16.295273118, 4), (-12.31848008, 4))
        make_face()
        with BuildLine():
            Line((-16.295273118, 26.4), (-16.295272761, 21.399999886))
            ThreePointArc((-16.295272761, 21.399999886), (-14.236321993, 23.843883878), (-12.31848008, 26.4))
            Line((-12.31848008, 26.4), (-16.295273118, 26.4))
        make_face()
        with BuildLine():
            Line((16.30472734, 26.4), (15.262410605, 26.4))
            ThreePointArc((15.262410605, 26.4), (15.765062943, 23.896142171), (16.30472734, 21.4))
            Line((16.30472734, 21.4), (16.30472734, 26.4))
        make_face()
        with BuildLine():
            Line((16.30472734, 4), (16.30472734, 9))
            ThreePointArc((16.30472734, 9), (15.765062943, 6.503857829), (15.262410605, 4))
            Line((15.262410605, 4), (16.30472734, 4))
        make_face()
    extrude(amount=FILLET8_5_DEPTH, mode=Mode.SUBTRACT)

    # Fillet9
    fillet9_edges = [part.edges().sort_by_distance(p)[0] for p in [
        (18.150000000000002, 2.76e-14, 7),
    ]]
    fillet(fillet9_edges, radius=FILLET9_R)


with BuildPart() as body_2:
    # Servo Micro: read off the stored shape, not the designer's step
    # Servo Micro outline → Servo Micro (new body)
    with BuildSketch(Plane(origin=(0, 0, 0), x_dir=(1, 0, 0), z_dir=(0, 1, 0)).offset(SERVO_START)):
        with Locations((-12.067487826, -26.388081974)):
            Rectangle(SERVO_MICRO_OUTLINE_W, SERVO_MICRO_OUTLINE_H)
    extrude(amount=SERVO_MICRO_DEPTH)

    # Servo Micro 2 outline → Servo Micro 2 (add)
    with BuildSketch(Plane(origin=(0, 0, 0), x_dir=(1, 0, 0), z_dir=(0, 1, 0)).offset(SERVO_START_2)):
        with BuildLine():
            ThreePointArc((-11.10082116, -25.109193568), (-23.367487826, -26.388081974), (-11.10082116, -27.666970381))
            ThreePointArc((-11.10082116, -27.666970381), (-9.567487826, -26.388081975), (-11.10082116, -25.109193568))
        make_face()
    extrude(amount=SERVO_MICRO_2_DEPTH)

    # Servo Micro 3 outline → Servo Micro 3 (add)
    with BuildSketch(Plane(origin=(0, 0, 0), x_dir=(1, 0, 0), z_dir=(0, 1, 0)).offset(SERVO_START_3)):
        with BuildLine():
            Line((2.567676828, -25.838081974), (4.232512174, -25.838081974))
            Line((4.232512174, -25.838081974), (4.232512174, -20.188081974))
            Line((4.232512174, -20.188081974), (-0.767487826, -20.188081974))
            Line((-0.767487826, -20.188081974), (-0.767487826, -32.588081974))
            Line((-0.767487826, -32.588081974), (4.232512174, -32.588081974))
            Line((4.232512174, -32.588081974), (4.232512174, -26.938081974))
            Line((4.232512174, -26.938081974), (2.567676828, -26.938081974))
            ThreePointArc((2.567676828, -26.938081974), (0.732512174, -26.388081974), (2.567676828, -25.838081974))
        make_face()
        with BuildLine():
            Line((-23.367487826, -32.588081974), (-23.367487826, -20.188081974))
            Line((-23.367487826, -20.188081974), (-28.367487826, -20.188081974))
            Line((-28.367487826, -20.188081974), (-28.367487826, -25.838081974))
            Line((-28.367487826, -25.838081974), (-26.702652481, -25.838081974))
            ThreePointArc((-26.702652481, -25.838081974), (-24.867487826, -26.388081974), (-26.702652481, -26.938081974))
            Line((-26.702652481, -26.938081974), (-28.367487826, -26.938081974))
            Line((-28.367487826, -26.938081974), (-28.367487826, -32.588081974))
            Line((-28.367487826, -32.588081974), (-23.367487826, -32.588081974))
        make_face()
    extrude(amount=SERVO_MICRO_3_DEPTH)

    # Servo Micro 4 outline → Servo Micro 4 (add)
    with BuildSketch(Plane(origin=(0, 0, 0), x_dir=(1, 0, 0), z_dir=(0, 1, 0)).offset(SERVO_START_4)):
        with Locations((-17.167487826, -26.388081974)):
            Circle(SERVO_MICRO_4_OUTLINE_R)
    extrude(amount=SERVO_MICRO_4_DEPTH)


with BuildPart() as body_3:
    # Servo Micro 5 outline → Servo Micro 5 (new body)
    with BuildSketch(Plane.YZ.offset(SERVO_START_5)):
        with Locations((-8.260864102, 25.188081974)):
            Circle(SERVO_MICRO_5_OUTLINE_R)
    extrude(amount=SERVO_MICRO_5_DEPTH)


with BuildPart() as body_4:
    # Servo Micro 6 outline → Servo Micro 6 (new body)
    with BuildSketch(Plane.YZ.offset(SERVO_START_5)):
        with Locations((-8.260864102, 27.588081974)):
            Circle(SERVO_MICRO_6_OUTLINE_R)
    extrude(amount=SERVO_MICRO_6_DEPTH)


with BuildPart() as body_5:
    # Servo Micro 7 outline → Servo Micro 7 (new body)
    with BuildSketch(Plane.YZ.offset(SERVO_START_5)):
        with Locations((-8.260864102, 26.388081974)):
            Circle(SERVO_MICRO_7_OUTLINE_R)
    extrude(amount=SERVO_MICRO_7_DEPTH)


with BuildPart() as body_2_1:
    # Body-Move/Copy1: read off the stored shape, not the designer's step
    # Body-Move/Copy1: moved
    add(body_2.part.moved(Location((12.0627605, 7.6108641, -11.188082))).rotate(Axis((0, 0, 0), (0, 0, -1)), BODY_MOVE_COPY1_ANGLE))


solid = part.part
